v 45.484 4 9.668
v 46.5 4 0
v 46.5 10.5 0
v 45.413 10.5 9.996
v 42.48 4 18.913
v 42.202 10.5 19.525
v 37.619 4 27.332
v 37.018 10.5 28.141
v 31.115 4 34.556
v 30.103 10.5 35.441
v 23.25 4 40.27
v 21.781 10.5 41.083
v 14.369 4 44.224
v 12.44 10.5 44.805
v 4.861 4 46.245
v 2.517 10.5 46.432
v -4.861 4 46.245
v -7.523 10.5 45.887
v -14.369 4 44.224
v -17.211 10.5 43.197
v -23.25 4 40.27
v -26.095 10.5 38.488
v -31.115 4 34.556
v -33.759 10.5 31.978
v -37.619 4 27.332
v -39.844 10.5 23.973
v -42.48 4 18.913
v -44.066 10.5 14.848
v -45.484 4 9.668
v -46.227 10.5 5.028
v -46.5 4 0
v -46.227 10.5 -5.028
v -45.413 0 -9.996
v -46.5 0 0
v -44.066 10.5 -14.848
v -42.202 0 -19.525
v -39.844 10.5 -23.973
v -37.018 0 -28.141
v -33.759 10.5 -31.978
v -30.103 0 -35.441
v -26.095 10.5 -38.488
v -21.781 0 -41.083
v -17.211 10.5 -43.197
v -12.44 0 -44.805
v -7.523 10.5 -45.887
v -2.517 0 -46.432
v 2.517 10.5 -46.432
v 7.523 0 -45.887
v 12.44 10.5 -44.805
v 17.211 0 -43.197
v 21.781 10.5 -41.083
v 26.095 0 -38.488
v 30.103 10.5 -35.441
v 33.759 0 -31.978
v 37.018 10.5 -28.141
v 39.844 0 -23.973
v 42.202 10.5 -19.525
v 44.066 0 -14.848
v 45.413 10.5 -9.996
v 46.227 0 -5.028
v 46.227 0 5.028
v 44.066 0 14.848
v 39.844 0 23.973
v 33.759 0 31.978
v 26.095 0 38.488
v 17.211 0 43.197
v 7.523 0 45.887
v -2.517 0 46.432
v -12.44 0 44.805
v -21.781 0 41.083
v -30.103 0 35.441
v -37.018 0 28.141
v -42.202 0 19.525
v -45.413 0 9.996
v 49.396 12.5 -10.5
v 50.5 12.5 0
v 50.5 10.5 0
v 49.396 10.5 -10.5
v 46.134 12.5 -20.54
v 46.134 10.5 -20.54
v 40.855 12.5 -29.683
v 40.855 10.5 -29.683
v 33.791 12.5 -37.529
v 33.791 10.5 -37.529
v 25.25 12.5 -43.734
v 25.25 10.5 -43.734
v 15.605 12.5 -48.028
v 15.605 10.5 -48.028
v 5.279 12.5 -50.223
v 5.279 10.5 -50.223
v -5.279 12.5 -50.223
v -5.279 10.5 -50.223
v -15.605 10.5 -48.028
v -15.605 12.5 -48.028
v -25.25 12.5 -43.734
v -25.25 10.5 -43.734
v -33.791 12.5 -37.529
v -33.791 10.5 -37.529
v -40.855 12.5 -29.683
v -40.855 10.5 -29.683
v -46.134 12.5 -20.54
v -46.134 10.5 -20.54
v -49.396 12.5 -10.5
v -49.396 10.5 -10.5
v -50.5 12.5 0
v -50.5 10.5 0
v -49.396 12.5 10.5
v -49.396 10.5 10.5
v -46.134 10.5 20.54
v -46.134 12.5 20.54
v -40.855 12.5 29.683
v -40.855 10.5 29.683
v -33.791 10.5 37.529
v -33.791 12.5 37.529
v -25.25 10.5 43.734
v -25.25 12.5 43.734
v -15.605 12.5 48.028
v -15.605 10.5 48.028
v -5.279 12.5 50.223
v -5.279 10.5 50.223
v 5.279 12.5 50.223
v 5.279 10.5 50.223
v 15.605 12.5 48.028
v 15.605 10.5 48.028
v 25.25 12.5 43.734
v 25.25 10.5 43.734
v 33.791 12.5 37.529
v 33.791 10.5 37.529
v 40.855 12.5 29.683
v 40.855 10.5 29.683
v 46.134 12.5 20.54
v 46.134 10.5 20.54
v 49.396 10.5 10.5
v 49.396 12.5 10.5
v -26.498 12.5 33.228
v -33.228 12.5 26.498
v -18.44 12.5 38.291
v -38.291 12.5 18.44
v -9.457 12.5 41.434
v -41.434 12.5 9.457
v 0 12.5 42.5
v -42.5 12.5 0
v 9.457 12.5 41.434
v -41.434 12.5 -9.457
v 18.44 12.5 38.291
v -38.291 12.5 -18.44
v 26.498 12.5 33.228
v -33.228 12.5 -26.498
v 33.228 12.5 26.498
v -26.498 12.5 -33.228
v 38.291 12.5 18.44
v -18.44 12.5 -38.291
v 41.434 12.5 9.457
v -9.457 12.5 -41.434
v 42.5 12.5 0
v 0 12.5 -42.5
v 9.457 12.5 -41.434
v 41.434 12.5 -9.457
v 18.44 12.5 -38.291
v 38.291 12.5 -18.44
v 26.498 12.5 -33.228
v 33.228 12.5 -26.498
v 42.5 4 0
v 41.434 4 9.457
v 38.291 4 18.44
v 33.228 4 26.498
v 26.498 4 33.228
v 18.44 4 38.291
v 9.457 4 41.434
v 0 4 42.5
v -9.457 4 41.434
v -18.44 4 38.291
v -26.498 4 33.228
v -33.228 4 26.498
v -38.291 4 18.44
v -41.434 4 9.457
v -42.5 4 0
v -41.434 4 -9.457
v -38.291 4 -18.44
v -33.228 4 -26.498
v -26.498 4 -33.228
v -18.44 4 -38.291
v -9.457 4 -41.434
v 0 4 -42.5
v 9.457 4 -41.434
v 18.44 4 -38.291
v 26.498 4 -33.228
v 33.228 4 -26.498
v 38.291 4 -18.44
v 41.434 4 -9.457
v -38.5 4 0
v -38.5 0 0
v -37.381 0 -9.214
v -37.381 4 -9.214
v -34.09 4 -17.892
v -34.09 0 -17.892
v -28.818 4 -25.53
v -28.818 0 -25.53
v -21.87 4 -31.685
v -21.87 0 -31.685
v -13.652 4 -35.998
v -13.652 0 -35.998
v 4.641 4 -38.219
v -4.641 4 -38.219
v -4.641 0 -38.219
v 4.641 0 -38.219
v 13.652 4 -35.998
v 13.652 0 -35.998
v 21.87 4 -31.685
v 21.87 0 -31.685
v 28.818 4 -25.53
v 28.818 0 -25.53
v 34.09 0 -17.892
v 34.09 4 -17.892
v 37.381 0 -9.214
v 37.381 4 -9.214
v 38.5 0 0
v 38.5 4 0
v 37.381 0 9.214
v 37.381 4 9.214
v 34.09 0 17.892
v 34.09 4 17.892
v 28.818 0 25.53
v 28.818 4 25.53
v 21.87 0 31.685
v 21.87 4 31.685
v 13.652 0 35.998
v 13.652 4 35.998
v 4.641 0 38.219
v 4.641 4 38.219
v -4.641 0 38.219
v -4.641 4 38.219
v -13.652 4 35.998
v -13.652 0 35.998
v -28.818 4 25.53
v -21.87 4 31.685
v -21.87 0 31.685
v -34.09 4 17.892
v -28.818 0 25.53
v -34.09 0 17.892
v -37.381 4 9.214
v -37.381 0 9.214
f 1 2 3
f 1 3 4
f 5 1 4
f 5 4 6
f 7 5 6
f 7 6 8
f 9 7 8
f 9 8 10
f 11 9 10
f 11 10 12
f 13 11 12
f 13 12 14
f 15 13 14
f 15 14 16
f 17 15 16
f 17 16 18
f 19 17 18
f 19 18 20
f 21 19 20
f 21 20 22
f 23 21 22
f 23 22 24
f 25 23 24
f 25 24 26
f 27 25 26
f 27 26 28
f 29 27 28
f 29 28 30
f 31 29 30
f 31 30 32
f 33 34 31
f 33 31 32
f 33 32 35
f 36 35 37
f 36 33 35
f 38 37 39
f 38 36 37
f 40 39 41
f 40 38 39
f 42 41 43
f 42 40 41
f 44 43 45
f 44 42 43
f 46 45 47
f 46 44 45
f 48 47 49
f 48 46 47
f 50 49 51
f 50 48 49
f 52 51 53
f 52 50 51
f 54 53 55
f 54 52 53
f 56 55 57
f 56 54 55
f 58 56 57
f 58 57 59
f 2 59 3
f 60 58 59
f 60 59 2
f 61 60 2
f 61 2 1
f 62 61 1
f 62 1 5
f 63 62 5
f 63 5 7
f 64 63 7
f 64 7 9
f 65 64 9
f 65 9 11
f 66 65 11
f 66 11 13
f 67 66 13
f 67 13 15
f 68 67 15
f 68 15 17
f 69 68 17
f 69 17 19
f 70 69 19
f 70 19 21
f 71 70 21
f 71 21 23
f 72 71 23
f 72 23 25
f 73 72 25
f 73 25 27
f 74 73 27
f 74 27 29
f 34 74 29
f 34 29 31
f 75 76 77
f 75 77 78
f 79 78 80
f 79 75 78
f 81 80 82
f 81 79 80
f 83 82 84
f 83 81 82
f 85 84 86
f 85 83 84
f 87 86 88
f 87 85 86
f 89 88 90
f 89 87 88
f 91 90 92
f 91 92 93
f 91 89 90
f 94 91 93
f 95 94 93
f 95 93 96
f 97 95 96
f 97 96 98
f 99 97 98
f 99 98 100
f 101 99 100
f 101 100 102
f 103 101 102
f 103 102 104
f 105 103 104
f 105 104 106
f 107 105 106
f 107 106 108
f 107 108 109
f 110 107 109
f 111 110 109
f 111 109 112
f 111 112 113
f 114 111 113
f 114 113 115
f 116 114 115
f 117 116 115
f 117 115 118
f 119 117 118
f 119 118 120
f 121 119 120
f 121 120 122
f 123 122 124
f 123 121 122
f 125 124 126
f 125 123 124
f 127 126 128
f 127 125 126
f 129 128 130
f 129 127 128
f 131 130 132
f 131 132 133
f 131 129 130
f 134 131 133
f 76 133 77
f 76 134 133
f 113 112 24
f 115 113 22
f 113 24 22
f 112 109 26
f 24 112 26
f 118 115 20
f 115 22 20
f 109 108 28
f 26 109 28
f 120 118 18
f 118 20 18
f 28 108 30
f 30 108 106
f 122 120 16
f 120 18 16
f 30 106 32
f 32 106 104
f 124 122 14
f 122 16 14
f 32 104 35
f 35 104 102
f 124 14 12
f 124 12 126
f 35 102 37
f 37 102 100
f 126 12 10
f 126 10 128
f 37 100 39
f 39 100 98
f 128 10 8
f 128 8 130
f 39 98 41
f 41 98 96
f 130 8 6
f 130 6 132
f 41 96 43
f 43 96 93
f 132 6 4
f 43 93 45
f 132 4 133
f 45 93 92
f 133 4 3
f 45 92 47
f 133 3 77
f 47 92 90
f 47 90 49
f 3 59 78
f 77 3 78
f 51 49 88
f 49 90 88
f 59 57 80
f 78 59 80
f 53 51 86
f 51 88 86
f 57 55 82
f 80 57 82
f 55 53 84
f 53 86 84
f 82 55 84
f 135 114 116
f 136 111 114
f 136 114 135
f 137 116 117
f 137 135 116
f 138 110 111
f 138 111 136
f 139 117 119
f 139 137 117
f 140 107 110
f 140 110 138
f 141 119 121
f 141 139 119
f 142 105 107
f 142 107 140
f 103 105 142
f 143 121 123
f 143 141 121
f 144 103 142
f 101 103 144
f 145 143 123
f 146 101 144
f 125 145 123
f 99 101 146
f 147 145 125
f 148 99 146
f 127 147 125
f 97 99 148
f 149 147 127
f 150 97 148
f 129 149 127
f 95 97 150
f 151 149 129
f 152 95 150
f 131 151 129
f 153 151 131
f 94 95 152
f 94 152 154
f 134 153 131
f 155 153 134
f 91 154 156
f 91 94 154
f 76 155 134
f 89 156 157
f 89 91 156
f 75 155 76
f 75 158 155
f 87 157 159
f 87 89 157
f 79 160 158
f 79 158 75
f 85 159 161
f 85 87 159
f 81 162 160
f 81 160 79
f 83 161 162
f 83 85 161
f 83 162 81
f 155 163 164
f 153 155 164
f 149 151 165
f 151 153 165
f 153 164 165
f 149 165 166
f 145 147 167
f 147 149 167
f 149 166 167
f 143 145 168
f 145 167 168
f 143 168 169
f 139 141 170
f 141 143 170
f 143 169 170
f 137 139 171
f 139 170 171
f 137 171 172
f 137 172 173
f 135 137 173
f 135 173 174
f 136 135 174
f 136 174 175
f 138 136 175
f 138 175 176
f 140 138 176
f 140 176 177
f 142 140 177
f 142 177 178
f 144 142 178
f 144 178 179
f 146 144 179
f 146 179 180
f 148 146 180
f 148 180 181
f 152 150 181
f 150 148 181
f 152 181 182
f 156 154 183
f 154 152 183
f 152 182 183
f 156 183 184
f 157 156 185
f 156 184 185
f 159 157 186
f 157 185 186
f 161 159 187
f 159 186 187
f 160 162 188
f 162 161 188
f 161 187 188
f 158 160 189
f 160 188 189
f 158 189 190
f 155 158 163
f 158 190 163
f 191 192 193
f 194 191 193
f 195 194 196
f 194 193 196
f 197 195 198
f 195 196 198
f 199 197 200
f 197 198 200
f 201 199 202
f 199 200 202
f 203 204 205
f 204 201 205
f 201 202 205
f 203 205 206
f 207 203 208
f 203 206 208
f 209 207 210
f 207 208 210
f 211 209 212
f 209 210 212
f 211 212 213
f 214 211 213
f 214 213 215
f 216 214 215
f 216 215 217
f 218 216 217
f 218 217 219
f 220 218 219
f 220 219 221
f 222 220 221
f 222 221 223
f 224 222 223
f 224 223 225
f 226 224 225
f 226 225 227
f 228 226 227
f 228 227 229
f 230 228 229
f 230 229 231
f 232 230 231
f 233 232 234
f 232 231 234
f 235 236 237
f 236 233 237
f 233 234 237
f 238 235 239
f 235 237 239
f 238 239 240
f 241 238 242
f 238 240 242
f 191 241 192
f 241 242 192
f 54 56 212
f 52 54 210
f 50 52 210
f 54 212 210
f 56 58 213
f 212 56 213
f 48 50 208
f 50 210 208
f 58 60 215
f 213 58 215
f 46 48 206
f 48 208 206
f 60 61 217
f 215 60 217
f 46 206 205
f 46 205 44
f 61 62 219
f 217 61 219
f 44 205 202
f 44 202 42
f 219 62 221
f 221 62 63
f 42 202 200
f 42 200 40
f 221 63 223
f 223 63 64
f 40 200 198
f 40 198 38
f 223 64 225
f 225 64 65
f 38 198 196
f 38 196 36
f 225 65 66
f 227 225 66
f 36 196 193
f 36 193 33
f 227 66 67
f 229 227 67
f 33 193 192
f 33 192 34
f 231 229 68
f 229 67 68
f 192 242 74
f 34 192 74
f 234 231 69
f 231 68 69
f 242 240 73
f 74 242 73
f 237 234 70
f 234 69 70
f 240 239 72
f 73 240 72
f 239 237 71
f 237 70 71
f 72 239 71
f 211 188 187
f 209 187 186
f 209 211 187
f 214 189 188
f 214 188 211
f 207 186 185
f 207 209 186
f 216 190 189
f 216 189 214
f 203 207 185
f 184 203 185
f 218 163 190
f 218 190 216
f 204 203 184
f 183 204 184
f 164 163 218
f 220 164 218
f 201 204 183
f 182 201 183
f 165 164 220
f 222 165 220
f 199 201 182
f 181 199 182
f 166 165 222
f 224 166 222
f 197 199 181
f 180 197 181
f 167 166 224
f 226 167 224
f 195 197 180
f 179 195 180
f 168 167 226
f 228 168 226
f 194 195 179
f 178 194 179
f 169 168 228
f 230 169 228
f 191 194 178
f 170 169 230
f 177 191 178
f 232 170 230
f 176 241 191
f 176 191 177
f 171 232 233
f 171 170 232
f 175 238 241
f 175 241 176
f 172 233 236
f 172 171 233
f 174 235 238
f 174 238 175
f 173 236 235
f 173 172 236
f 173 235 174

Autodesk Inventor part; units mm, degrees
ref_plane "YZ Plane" through (0, 0, 0) normal (1, 0, 0) x (0, 1, 0)
ref_plane "XZ Plane" through (0, 0, 0) normal (0, 1, 0) x (-1, 0, 0)
ref_plane "XY Plane" through (0, 0, 0) normal (0, 0, 1) x (1, 0, 0)
sketch "Эскиз1" plane through (0, 0, 0) normal (0, 1, 0) x (-1, 0, 0)
  circle A0 centre (0, 0) radius 46.5
  circle A1 centre (0, 0) radius 38.5
  point P0 (0, 38.5)
  point P1 (0, 46.5)
  dimension "d0" = 93
  dimension "d3" = 8
extrude "Выдавливание1" add sketch "Эскиз1" along normal blind 4
sketch "Эскиз2" plane through (0, 4, 0) normal (0, 1, 0) x (1, 0, 0)
  circle A0 centre (0, 0) radius 46.5
  circle A1 centre (0, 0) radius 42.5
  circle A2 centre (0, 0) radius 46.5 projected
  point P0 (0, -42.5)
  point P1 (0, -46.5)
  point P2 (0, -46.5)
  dimension "d4" = 4
  dimension "d5" = 0
extrude "Выдавливание2" add sketch "Эскиз2" along normal blind 8.5
sketch "Эскиз3" plane through (0, 12.5, 0) normal (0, 1, 0) x (1, 0, 0)
  circle A0 centre (0, 0) radius 46.5
  circle A1 centre (0, 0) radius 50.5
  circle A2 centre (0, 0) radius 46.5 projected
  point P0 (-46.5, 0)
  point P1 (-50.5, 0)
  dimension "d8" = 93
  dimension "d9" = 4
extrude "Выдавливание3" add sketch "Эскиз3" against normal blind 2
properties part number "внешнее кольцо подшипника" material "Стекло"
